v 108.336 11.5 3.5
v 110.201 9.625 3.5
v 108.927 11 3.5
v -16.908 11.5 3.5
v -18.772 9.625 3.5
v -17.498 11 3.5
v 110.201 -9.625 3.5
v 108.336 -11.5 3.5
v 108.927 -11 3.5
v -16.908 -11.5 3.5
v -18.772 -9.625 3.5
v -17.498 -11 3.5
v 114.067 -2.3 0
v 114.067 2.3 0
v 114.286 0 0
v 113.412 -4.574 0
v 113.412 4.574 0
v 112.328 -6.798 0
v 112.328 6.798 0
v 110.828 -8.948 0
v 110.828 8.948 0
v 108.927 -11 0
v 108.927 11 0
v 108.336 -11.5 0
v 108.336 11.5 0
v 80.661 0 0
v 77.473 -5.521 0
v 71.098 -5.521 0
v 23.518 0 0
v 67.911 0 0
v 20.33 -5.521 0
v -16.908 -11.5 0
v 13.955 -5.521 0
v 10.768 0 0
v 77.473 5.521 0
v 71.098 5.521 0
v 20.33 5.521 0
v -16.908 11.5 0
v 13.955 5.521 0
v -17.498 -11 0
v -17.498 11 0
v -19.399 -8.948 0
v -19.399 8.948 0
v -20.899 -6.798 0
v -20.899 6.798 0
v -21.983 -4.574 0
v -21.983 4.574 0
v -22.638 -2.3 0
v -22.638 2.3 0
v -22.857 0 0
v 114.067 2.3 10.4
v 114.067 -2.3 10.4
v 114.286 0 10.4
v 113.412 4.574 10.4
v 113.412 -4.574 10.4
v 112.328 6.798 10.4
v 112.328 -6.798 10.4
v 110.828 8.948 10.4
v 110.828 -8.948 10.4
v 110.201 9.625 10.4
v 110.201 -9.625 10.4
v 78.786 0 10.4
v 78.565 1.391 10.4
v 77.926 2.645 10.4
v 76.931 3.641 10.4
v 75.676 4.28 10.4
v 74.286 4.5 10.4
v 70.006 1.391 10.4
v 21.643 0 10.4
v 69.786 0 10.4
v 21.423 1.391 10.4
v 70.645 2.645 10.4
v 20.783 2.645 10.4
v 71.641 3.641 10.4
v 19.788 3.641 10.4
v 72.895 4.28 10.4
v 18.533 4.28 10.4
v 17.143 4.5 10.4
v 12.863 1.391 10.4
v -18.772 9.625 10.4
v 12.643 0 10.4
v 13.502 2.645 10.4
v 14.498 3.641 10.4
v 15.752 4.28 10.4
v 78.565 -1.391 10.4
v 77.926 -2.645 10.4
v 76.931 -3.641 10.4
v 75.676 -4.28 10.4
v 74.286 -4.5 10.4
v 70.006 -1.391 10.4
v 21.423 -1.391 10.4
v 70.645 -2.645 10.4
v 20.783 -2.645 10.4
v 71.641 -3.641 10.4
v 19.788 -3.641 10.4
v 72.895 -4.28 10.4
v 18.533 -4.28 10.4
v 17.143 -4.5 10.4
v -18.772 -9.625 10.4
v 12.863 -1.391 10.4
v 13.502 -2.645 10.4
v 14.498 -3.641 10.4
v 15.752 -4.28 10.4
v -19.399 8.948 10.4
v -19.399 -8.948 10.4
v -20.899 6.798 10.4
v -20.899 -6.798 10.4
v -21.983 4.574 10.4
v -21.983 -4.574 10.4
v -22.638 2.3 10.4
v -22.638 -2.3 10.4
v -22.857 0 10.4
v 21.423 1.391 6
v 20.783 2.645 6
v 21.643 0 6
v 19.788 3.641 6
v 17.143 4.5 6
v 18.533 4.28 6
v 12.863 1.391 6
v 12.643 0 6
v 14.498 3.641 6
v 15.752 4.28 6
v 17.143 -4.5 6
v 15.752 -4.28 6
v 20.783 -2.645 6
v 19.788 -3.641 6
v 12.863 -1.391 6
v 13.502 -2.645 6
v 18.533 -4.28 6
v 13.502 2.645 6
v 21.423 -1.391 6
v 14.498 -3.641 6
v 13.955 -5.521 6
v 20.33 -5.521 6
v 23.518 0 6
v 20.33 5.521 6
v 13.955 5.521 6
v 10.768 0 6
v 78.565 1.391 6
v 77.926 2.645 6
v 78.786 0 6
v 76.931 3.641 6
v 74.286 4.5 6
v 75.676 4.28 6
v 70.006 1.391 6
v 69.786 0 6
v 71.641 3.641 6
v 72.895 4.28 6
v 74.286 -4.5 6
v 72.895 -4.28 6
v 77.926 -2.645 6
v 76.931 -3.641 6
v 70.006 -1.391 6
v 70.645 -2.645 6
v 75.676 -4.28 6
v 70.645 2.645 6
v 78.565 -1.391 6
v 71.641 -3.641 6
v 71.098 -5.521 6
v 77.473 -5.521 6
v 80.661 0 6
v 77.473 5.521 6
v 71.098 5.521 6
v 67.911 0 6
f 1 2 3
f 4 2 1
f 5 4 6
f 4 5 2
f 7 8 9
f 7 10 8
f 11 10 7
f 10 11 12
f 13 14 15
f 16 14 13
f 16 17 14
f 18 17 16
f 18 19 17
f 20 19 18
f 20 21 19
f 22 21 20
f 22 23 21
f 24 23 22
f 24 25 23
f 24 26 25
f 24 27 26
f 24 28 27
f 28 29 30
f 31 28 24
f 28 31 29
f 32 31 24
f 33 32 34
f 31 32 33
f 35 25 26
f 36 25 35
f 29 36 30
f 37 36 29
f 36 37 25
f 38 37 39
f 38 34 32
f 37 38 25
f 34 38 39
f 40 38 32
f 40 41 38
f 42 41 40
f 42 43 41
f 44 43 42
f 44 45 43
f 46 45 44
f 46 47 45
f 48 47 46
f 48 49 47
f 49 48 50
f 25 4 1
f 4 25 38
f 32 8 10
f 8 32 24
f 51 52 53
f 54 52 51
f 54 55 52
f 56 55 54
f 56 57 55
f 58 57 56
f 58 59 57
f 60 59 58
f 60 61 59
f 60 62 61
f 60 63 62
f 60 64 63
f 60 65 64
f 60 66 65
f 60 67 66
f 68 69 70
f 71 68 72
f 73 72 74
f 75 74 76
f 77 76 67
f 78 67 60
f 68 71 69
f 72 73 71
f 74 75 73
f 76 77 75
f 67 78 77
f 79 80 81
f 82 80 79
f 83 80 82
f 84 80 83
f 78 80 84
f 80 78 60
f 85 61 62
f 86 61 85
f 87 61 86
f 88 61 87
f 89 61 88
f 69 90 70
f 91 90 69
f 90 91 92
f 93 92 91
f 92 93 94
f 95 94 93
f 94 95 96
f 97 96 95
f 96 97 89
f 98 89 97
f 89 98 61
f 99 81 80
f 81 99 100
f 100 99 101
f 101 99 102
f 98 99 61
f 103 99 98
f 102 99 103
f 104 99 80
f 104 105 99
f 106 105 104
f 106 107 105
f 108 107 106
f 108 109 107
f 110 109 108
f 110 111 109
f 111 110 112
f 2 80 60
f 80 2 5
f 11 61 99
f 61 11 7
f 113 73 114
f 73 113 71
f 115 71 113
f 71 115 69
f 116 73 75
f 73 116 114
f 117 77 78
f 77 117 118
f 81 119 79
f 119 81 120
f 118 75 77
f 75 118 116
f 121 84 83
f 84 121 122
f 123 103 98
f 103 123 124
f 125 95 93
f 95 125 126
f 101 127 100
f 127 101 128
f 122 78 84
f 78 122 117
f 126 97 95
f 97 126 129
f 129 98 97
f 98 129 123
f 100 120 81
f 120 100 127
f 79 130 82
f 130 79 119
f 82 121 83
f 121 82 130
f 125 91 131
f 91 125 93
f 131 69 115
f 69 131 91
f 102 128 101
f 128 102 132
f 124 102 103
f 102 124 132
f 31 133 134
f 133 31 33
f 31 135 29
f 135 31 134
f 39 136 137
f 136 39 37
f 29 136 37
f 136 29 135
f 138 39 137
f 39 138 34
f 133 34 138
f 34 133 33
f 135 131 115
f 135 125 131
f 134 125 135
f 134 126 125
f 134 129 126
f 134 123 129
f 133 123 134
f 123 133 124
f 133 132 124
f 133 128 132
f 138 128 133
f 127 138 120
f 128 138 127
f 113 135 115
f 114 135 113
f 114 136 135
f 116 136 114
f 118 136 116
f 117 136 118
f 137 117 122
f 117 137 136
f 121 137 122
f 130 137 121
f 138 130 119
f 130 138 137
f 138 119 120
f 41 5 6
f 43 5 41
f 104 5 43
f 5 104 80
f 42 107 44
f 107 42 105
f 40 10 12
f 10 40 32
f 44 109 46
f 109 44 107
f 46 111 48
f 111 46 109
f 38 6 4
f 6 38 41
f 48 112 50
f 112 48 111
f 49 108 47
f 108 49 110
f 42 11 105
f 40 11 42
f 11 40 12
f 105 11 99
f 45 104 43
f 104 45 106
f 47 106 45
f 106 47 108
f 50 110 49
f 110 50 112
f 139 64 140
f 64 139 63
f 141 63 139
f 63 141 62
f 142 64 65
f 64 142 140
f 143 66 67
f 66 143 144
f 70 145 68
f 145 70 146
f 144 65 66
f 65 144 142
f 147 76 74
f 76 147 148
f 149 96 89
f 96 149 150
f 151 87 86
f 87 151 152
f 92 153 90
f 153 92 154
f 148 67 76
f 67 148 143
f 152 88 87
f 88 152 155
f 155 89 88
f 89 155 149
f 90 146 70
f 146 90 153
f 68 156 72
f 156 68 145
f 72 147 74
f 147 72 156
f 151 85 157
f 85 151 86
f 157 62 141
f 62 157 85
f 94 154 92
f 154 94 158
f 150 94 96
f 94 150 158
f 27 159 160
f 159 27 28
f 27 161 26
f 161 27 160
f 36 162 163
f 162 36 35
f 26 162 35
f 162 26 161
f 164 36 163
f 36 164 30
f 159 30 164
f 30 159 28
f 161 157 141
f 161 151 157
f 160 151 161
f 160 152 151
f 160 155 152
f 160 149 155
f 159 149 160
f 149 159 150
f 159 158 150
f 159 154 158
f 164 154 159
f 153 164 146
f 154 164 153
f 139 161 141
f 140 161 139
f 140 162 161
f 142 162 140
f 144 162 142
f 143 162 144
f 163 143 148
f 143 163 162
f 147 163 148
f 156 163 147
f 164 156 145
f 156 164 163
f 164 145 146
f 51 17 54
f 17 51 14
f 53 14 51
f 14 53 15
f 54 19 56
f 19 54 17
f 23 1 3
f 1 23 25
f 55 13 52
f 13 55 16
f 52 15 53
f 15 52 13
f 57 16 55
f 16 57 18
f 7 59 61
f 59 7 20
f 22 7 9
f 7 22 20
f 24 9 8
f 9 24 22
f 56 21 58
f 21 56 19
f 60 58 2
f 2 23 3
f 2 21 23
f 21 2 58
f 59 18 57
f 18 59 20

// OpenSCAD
/* [Part-specific settings] */
// Number of many segments long
segments=2;

// Length of each segment
segment_length = 80;

// Bolt (true) or countersink for wood screw (false)
bolt = true; // [true,false]

// Inset bottom groove to lock into miter slot, `false` for a drop-in runner
groove = true; // [true,false]

// Chain: `true` to cope end for multi-part longer runners
chain = false; // [true,false]

/* [Tool-specific Miter Slot Dimensions] */

// Width of the main miter slot
slot_width = 19.25; 
// Total height of the bar
slot_height = 10.40;

// T Groove dimensions for bottom of miter slot
groove_width = 23;
groove_height = 3.5;

/* [Fastener Holes - Nut + Bolt or Wood Screw] */

// 1/4"-20 Imperial Nut + Bolt
nut_width = 12.75;
nut_height = 6;
bolt_diameter = 6.9;

// #6 Imperial Wood Screw
screw_width = 9;
screw_height = 3.3;
screw_diameter = 4.5;

// =====================================

module tslot_segment(t, slot_length, bolt, groove, chain){
    translate([(-slot_length/2)+(slot_length*(t/1.4)), 0, 0])
    difference(){
    intersection(){
        difference(){
            union(){
                if (groove) {
                  // groove
                  translate([-slot_length/2, -groove_width/2, 0])
                  cube([slot_length, groove_width,groove_height], 0);

                  // slot
                  translate([-slot_length/2, -slot_width/2, groove_height])
                  cube([slot_length,slot_width,slot_height-groove_height], 0);
                }
                else  {
                  // slot
                  translate([-slot_length/2, -slot_width/2, 0])
                  cube([slot_length,slot_width,slot_height], 0);
                }

            }
            // bolt/screw cutout
            cylinder(h=slot_height + groove_height, d=screw_width, $fn=20);

            if (bolt) {
                // nut cutout
                cylinder(h=nut_height, d=nut_width, $fn=6);
            }
            else {
                // countersink screw head space
                cylinder(h=nut_height, d1=nut_width, d2=screw_width, $fn=20);
            }
        }

        // Round corner edges
        scale([1,.55,1])
        cylinder(h=slot_height, d=slot_length, $fn=60);
    }
    // end cutout for extensions
    if (chain) {
        scale([1,.55,1]) translate([slot_length*.96,0,0])
        cylinder(h=slot_height, d=slot_length, $fn=60);
    }
    }
}

module tslot(segments=1, slot_length=80, bolt=true, groove=true, chain=false) {
    for (i =[1:segments]){
        tslot_segment(i, slot_length, bolt, groove, chain);
    }
}

tslot(segments, segment_length, bolt, groove, chain);
